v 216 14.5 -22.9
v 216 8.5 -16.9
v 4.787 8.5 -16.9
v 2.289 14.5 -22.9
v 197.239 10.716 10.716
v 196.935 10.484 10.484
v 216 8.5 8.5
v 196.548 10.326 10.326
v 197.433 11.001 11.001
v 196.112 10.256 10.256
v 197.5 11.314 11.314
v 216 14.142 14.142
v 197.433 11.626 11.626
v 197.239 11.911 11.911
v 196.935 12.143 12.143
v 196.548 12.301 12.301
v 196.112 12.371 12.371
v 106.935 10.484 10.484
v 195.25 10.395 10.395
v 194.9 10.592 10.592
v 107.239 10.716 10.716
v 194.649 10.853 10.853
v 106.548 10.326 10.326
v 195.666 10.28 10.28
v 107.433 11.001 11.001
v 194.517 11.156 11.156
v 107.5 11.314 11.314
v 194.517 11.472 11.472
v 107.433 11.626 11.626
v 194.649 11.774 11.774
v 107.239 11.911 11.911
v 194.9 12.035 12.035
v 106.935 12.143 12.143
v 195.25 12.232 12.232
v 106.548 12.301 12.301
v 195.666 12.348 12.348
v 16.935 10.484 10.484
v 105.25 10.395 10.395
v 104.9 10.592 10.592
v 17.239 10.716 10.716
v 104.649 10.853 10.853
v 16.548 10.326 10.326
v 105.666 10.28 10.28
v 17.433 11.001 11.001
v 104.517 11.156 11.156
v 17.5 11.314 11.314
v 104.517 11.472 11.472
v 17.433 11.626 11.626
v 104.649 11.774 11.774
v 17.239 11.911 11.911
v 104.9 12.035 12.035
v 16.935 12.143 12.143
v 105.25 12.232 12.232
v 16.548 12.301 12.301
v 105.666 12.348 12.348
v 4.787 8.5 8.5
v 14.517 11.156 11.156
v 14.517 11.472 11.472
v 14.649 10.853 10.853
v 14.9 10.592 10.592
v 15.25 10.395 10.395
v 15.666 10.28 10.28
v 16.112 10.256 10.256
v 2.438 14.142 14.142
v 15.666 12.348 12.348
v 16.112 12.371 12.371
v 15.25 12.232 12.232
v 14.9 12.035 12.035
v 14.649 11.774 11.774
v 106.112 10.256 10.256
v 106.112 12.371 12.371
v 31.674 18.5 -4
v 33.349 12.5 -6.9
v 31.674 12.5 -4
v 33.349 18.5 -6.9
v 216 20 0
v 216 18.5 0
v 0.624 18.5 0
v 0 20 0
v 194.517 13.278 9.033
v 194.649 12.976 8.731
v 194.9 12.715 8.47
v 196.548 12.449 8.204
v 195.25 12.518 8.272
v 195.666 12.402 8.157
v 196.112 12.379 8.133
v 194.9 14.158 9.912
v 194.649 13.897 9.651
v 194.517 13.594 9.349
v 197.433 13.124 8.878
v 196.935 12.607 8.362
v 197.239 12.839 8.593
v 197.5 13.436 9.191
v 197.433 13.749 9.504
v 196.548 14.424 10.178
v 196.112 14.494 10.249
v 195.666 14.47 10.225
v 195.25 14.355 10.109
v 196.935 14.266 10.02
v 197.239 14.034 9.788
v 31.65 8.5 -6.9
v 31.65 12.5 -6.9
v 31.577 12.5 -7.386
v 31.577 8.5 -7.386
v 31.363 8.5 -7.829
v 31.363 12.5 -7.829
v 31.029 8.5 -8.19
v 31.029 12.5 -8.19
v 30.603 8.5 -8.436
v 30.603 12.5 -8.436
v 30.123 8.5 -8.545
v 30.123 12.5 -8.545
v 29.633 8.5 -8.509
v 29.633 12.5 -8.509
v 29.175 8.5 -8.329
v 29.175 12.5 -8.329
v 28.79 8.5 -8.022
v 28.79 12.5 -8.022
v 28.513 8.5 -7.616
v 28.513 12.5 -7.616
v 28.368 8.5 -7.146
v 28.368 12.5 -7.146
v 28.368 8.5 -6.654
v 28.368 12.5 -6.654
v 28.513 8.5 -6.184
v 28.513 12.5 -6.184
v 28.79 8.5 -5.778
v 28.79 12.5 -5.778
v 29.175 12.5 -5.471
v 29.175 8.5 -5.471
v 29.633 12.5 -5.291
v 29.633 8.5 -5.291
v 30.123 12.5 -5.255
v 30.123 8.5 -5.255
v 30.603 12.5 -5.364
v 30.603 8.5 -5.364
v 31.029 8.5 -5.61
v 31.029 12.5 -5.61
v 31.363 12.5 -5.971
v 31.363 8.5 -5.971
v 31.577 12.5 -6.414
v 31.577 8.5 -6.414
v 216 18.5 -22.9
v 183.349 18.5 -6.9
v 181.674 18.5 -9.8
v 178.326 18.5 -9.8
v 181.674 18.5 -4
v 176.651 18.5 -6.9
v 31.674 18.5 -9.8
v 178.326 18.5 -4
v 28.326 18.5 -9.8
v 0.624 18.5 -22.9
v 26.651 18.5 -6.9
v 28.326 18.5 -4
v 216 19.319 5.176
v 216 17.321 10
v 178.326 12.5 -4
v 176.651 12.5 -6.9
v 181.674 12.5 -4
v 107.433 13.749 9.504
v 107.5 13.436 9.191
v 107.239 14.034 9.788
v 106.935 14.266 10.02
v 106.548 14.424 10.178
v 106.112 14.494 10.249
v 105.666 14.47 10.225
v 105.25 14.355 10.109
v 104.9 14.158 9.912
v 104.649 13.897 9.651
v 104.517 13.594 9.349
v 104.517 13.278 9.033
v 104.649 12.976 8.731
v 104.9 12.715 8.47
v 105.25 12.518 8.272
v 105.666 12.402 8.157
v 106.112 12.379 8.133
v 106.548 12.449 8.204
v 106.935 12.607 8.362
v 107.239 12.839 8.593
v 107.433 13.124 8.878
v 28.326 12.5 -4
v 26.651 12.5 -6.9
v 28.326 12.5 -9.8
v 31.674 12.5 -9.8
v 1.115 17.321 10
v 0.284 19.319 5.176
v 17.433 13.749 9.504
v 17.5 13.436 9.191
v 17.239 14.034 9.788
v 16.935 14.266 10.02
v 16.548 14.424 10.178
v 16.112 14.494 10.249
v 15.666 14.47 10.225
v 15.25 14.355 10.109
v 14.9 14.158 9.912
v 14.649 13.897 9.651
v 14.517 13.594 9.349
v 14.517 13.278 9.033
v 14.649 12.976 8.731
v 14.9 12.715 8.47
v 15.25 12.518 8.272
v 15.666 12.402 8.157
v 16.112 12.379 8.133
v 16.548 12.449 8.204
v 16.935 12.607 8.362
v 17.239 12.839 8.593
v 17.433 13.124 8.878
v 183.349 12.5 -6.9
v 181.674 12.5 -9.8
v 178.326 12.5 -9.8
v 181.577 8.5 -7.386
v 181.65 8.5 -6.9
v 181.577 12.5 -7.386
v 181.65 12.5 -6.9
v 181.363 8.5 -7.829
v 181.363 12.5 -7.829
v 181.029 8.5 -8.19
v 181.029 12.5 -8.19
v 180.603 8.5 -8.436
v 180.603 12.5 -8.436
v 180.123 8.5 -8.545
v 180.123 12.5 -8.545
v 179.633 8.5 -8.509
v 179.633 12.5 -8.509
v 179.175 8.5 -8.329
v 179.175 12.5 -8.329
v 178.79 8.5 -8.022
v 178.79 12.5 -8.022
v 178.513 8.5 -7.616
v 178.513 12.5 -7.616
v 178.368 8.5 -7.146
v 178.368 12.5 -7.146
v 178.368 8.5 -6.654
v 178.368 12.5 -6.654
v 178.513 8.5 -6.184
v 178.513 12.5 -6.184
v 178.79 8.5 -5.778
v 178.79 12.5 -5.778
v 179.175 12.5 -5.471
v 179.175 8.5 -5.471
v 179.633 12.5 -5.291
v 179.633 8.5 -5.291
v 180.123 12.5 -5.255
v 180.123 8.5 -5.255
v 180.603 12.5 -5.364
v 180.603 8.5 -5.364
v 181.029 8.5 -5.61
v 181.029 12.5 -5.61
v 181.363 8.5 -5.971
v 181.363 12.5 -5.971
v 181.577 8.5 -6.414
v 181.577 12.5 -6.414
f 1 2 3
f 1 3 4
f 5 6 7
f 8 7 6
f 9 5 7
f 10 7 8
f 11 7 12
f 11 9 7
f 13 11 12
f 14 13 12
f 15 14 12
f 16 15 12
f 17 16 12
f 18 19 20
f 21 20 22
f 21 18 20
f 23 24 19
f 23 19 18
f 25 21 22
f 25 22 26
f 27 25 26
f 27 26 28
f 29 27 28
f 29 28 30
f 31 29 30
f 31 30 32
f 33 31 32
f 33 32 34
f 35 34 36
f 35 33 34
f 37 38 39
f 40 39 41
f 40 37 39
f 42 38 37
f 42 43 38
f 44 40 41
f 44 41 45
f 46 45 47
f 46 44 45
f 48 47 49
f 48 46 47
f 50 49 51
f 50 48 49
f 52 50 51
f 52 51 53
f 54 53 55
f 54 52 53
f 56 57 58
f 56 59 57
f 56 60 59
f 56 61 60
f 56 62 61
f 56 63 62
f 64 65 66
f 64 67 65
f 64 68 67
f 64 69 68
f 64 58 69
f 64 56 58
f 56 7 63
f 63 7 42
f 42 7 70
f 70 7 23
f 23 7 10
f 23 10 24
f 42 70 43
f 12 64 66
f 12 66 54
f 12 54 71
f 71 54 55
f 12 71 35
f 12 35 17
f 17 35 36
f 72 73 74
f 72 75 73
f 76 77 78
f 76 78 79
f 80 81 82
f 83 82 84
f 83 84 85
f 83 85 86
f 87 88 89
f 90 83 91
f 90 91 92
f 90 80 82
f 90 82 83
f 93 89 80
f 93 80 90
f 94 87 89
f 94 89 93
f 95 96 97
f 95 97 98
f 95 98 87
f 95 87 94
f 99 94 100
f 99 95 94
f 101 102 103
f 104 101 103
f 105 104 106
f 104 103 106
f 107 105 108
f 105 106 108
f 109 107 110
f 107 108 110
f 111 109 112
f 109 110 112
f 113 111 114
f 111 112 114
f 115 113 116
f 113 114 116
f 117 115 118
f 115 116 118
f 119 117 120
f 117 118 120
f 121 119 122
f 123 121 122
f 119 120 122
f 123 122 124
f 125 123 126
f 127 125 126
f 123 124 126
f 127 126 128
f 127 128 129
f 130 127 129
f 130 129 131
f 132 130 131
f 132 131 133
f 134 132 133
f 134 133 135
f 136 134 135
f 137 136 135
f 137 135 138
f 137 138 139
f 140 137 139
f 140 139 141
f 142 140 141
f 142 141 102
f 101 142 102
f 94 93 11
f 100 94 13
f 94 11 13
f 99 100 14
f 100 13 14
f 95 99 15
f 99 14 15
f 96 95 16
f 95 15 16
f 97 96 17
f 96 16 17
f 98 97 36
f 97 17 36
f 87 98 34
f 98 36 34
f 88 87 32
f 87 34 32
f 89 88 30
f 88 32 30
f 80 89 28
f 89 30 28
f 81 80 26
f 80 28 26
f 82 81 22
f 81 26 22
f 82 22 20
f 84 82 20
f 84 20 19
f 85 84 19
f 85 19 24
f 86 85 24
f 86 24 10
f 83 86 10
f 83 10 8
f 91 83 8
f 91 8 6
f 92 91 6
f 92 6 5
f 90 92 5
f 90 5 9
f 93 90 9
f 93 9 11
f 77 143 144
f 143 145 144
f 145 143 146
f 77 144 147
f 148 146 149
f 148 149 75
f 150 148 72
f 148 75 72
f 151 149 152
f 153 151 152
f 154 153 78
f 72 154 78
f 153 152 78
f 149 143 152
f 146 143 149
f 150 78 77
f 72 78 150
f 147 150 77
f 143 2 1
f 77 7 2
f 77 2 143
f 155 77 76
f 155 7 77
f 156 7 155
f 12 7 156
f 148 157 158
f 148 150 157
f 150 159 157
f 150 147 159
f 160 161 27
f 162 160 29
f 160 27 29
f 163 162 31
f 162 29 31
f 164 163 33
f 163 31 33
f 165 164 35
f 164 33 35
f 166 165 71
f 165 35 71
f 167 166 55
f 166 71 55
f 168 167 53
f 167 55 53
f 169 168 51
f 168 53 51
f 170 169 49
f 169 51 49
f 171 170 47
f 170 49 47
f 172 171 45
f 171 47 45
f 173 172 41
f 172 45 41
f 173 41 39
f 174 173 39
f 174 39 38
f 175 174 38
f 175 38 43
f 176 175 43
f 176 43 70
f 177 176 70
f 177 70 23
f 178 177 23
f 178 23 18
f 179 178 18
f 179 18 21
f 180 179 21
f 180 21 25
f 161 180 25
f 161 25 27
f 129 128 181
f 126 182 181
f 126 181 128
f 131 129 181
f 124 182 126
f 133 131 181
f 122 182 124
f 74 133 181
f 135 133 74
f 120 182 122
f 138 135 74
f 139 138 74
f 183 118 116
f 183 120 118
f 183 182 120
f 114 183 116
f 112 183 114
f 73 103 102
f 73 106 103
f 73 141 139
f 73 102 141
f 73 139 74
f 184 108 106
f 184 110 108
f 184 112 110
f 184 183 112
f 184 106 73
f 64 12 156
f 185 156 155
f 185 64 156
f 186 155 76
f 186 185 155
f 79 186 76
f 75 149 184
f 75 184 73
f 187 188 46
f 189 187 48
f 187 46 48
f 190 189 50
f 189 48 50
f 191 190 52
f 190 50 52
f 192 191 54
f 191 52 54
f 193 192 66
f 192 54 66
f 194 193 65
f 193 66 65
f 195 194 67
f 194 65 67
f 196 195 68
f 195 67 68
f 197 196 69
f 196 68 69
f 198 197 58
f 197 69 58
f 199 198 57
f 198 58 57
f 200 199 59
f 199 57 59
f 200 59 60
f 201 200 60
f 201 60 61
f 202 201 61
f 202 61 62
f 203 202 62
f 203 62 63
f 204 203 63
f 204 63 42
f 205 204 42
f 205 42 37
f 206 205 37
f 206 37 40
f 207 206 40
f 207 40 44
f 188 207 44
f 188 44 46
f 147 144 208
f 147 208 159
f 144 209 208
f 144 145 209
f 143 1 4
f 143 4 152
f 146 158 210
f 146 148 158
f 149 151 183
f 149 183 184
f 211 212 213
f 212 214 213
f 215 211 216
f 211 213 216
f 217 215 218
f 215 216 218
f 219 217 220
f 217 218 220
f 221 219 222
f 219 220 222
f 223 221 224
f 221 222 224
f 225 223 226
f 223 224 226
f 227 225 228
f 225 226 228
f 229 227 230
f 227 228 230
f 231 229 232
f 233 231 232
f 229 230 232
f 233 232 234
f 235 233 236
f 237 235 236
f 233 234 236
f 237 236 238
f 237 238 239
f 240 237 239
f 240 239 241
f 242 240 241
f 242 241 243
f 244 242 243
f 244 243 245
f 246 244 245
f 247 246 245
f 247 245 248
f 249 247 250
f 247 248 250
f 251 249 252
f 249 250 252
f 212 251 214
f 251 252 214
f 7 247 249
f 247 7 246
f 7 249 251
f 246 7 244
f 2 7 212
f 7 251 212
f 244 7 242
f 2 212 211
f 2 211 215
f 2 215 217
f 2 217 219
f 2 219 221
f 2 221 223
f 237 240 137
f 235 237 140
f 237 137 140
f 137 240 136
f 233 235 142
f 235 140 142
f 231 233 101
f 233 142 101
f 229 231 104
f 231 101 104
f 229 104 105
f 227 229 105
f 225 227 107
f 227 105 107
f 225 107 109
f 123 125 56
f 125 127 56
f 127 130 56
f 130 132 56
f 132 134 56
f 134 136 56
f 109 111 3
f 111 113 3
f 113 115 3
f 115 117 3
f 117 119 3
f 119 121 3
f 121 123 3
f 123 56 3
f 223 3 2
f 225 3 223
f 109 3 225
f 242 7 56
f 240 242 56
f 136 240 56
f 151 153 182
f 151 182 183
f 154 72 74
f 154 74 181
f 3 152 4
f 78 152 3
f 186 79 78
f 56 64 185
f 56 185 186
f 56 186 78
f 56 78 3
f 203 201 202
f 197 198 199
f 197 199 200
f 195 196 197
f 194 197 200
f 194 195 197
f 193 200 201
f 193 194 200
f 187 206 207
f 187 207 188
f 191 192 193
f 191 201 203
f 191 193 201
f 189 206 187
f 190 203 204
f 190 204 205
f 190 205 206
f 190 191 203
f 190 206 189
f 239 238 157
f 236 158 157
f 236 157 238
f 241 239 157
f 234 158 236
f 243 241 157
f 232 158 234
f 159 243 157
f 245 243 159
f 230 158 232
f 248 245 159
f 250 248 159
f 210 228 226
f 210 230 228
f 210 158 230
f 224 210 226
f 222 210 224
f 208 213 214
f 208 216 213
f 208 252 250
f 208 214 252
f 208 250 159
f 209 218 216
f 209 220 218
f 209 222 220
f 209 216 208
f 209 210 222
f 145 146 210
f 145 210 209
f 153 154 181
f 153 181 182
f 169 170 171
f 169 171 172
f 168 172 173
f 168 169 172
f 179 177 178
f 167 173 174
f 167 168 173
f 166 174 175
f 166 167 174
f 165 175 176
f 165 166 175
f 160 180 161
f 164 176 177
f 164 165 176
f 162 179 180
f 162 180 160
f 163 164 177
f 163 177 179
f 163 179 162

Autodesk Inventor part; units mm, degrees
ref_plane "YZ Plane" through (0, 0, 0) normal (1, 0, 0) x (0, 1, 0)
ref_plane "XZ Plane" through (0, 0, 0) normal (0, 1, 0) x (-1, 0, 0)
ref_plane "XY Plane" through (0, 0, 0) normal (0, 0, 1) x (1, 0, 0)
sketch "Sketch1" plane through (0, 0, 0) normal (1, 0, 0) x (0, 1, 0)
  circle A0 centre (0, 0) radius 20
  line L0 (8.5, 8.5) -> (-16.9, 8.5)
  line L1 (8.5, 8.5) -> (8.5, -16.9)
  line L2 (0, 0) -> (0, 20)
  line L3 (0, 20) -> (-60.9241, 20)
  line L4 (-60.9241, 20) -> (-60.9241, 18.5)
  line L5 (-60.9241, 18.5) -> (0, 18.5)
  line L6 (0, 18.5) -> (0, 20)
  line L7 (0, 0) -> (14.1421, 14.1421)
  line L8 (0, 0) -> (20, 0)
  line L9 (-16.9, 8.5) -> (-16.9, 18.5)
  line L10 (-16.9, 8.5) -> (-22.9, 14.5)
  line L11 (-22.9, 14.5) -> (-22.9, 18.5)
  line L12 (12.3744, 12.3744) -> (12.1502, 13.2109)
  line L13 (11.3137, 13.435) -> (9.2071, 11.3284)
  line L14 (9.4313, 10.4919) -> (10.2678, 10.2678)
  line L15 (8.5, 8.5) -> (8.5, -16.9)
  line L16 (20, 0) -> (20, -60.9241)
  line L17 (20, -60.9241) -> (18.5, -60.9241)
  line L18 (18.5, -60.9241) -> (18.5, 0)
  line L19 (8.5, -16.9) -> (18.5, -16.9)
  line L20 (8.5, -16.9) -> (14.5, -22.9)
  line L21 (14.5, -22.9) -> (18.5, -22.9)
  arc A1 (9.2071, 11.3284) -> (9.4313, 10.4919) centre (9.5607, 10.9749) ccw
  arc A2 (12.1502, 13.2109) -> (11.3137, 13.435) centre (11.6673, 13.0815) ccw
  line L22 (10.4311, 10.4311) -> (9.483, 10.6851)
  arc A3 (9.3485, 11.187) -> (9.483, 10.6851) centre (9.5607, 10.9749) ccw
  line L23 (9.3485, 11.187) -> (11.4551, 13.2936)
  arc A4 (11.957, 13.1591) -> (11.4551, 13.2936) centre (11.6673, 13.0815) ccw
  line L24 (11.957, 13.1591) -> (12.2111, 12.2111)
  point P0 (0, 8.5)
  point P1 (-17.7041, 9.3041)
  point P2 (-16.9, 10.6953)
  point P3 (10.6953, -16.9)
  point P4 (9.3041, -17.7041)
  point P5 (18.5, 0)
  dimension "d0" = 40
  dimension "d1" = 25.4
  dimension "d2" = 1.5
  dimension "d4" = 45
  dimension "d6" = 45
  dimension "d7" = 4
  dimension "d8" = 10
  dimension "d10" = 2.5
  dimension "d11" = 2.5
  dimension "d12" = 60
  dimension "d13" = 1.5
  dimension "d15" = 0.5
  dimension "d16" = 0.2
extrude "Extrusion1" add sketch "Sketch1" along normal blind 216 contours L8 L1 L7 A0 | L18 L19 A0 | A0 L19 L1 L8 L18 | L19 L18 L21 L20 A0 | A0 L20 L19
sketch "Sketch3" plane through (0, 18.5, 0) normal (0, 1, 0) x (1, 0, 0)
  line L0 (0, 22.9) -> (0, 0) projected
  line L1 (0, 0) -> (216, 0) projected
  line L2 (216, 22.9) -> (216, 0) projected
  line L3 (0, 22.9) -> (216, 22.9) projected
  line L4 (0, 16.9) -> (216, 16.9) projected
  line L5 (28.3257, 4) -> (26.6514, 6.9)
  line L6 (26.6514, 6.9) -> (28.3257, 9.8)
  line L7 (28.3257, 9.8) -> (31.6743, 9.8)
  line L8 (31.6743, 9.8) -> (33.3486, 6.9)
  line L9 (33.3486, 6.9) -> (31.6743, 4)
  line L10 (31.6743, 4) -> (28.3257, 4)
  circle A0 centre (30, 6.9) radius 1.65
  point P0 (0, 0)
  dimension "d28" = 5.8
  dimension "d29" = 10
  dimension "d30" = 30
  dimension "d31" = 3.3
extrude "Extrusion4" cut sketch "Sketch3" against normal blind 6 contours L5 L6 L7 L8 L9 L10 | A0
extrude "Extrusion5" cut sketch "Sketch3" against normal through all contours A0
sketch "Sketch4" plane through (0, 14.5, -22.9) normal (0, 0, -1) x (-1, 0, 0)
  line L0 (0, -6) -> (0, 0) projected
  line L1 (0, 0) -> (0, 4) projected
  line L2 (0, 4) -> (0, 5.5) projected
  line L3 (0, -6) -> (-216, -6) projected
  line L4 (0, 5.5) -> (-216, 5.5) projected
  line L5 (0, 5.5) -> (-4.787, -6)
  point P0 (0, -14.5)
  dimension "d36" = 112.6
extrude "Extrusion6" cut sketch "Sketch4" along normal through all both and the other way through all
pattern_linear "Rectangular Pattern1" count 2 spacing 150 along (1, 0, 0) of "Extrusion5", "Extrusion4"
sketch "Sketch5" plane through (2.4384, 14.1421, 14.1421) normal (0, -0.7071, 0.7071) x (1, 0, 0)
  line L0 (0, 0) -> (2.3486, -7.9792) projected
  line L1 (2.3486, -7.9792) -> (213.5616, -7.9792) projected
  line L2 (213.5616, 0) -> (213.5616, -7.9792) projected
  line L3 (0, 0) -> (213.5616, 0) projected
  circle A0 centre (193.5616, -4) radius 1.5
  line L4 (0, 0) -> (213.5616, 0) projected
  circle A1 centre (103.5616, -4) radius 1.5
  circle A2 centre (13.5616, -4) radius 1.5
  point P0 (-2.4384, -20)
  point P1 (106.7808, 0)
  point P2 (106.7808, 0)
  dimension "d42" = 3
  dimension "d44" = 4
  dimension "d45" = 20
  dimension "d48" = 90
extrude "Extrusion7" cut sketch "Sketch5" against normal blind 3 contours A0 | A1 | A2
properties part number "ESQUINA_REDONDEADA_R20" material "Steel, Mild, Welded"
